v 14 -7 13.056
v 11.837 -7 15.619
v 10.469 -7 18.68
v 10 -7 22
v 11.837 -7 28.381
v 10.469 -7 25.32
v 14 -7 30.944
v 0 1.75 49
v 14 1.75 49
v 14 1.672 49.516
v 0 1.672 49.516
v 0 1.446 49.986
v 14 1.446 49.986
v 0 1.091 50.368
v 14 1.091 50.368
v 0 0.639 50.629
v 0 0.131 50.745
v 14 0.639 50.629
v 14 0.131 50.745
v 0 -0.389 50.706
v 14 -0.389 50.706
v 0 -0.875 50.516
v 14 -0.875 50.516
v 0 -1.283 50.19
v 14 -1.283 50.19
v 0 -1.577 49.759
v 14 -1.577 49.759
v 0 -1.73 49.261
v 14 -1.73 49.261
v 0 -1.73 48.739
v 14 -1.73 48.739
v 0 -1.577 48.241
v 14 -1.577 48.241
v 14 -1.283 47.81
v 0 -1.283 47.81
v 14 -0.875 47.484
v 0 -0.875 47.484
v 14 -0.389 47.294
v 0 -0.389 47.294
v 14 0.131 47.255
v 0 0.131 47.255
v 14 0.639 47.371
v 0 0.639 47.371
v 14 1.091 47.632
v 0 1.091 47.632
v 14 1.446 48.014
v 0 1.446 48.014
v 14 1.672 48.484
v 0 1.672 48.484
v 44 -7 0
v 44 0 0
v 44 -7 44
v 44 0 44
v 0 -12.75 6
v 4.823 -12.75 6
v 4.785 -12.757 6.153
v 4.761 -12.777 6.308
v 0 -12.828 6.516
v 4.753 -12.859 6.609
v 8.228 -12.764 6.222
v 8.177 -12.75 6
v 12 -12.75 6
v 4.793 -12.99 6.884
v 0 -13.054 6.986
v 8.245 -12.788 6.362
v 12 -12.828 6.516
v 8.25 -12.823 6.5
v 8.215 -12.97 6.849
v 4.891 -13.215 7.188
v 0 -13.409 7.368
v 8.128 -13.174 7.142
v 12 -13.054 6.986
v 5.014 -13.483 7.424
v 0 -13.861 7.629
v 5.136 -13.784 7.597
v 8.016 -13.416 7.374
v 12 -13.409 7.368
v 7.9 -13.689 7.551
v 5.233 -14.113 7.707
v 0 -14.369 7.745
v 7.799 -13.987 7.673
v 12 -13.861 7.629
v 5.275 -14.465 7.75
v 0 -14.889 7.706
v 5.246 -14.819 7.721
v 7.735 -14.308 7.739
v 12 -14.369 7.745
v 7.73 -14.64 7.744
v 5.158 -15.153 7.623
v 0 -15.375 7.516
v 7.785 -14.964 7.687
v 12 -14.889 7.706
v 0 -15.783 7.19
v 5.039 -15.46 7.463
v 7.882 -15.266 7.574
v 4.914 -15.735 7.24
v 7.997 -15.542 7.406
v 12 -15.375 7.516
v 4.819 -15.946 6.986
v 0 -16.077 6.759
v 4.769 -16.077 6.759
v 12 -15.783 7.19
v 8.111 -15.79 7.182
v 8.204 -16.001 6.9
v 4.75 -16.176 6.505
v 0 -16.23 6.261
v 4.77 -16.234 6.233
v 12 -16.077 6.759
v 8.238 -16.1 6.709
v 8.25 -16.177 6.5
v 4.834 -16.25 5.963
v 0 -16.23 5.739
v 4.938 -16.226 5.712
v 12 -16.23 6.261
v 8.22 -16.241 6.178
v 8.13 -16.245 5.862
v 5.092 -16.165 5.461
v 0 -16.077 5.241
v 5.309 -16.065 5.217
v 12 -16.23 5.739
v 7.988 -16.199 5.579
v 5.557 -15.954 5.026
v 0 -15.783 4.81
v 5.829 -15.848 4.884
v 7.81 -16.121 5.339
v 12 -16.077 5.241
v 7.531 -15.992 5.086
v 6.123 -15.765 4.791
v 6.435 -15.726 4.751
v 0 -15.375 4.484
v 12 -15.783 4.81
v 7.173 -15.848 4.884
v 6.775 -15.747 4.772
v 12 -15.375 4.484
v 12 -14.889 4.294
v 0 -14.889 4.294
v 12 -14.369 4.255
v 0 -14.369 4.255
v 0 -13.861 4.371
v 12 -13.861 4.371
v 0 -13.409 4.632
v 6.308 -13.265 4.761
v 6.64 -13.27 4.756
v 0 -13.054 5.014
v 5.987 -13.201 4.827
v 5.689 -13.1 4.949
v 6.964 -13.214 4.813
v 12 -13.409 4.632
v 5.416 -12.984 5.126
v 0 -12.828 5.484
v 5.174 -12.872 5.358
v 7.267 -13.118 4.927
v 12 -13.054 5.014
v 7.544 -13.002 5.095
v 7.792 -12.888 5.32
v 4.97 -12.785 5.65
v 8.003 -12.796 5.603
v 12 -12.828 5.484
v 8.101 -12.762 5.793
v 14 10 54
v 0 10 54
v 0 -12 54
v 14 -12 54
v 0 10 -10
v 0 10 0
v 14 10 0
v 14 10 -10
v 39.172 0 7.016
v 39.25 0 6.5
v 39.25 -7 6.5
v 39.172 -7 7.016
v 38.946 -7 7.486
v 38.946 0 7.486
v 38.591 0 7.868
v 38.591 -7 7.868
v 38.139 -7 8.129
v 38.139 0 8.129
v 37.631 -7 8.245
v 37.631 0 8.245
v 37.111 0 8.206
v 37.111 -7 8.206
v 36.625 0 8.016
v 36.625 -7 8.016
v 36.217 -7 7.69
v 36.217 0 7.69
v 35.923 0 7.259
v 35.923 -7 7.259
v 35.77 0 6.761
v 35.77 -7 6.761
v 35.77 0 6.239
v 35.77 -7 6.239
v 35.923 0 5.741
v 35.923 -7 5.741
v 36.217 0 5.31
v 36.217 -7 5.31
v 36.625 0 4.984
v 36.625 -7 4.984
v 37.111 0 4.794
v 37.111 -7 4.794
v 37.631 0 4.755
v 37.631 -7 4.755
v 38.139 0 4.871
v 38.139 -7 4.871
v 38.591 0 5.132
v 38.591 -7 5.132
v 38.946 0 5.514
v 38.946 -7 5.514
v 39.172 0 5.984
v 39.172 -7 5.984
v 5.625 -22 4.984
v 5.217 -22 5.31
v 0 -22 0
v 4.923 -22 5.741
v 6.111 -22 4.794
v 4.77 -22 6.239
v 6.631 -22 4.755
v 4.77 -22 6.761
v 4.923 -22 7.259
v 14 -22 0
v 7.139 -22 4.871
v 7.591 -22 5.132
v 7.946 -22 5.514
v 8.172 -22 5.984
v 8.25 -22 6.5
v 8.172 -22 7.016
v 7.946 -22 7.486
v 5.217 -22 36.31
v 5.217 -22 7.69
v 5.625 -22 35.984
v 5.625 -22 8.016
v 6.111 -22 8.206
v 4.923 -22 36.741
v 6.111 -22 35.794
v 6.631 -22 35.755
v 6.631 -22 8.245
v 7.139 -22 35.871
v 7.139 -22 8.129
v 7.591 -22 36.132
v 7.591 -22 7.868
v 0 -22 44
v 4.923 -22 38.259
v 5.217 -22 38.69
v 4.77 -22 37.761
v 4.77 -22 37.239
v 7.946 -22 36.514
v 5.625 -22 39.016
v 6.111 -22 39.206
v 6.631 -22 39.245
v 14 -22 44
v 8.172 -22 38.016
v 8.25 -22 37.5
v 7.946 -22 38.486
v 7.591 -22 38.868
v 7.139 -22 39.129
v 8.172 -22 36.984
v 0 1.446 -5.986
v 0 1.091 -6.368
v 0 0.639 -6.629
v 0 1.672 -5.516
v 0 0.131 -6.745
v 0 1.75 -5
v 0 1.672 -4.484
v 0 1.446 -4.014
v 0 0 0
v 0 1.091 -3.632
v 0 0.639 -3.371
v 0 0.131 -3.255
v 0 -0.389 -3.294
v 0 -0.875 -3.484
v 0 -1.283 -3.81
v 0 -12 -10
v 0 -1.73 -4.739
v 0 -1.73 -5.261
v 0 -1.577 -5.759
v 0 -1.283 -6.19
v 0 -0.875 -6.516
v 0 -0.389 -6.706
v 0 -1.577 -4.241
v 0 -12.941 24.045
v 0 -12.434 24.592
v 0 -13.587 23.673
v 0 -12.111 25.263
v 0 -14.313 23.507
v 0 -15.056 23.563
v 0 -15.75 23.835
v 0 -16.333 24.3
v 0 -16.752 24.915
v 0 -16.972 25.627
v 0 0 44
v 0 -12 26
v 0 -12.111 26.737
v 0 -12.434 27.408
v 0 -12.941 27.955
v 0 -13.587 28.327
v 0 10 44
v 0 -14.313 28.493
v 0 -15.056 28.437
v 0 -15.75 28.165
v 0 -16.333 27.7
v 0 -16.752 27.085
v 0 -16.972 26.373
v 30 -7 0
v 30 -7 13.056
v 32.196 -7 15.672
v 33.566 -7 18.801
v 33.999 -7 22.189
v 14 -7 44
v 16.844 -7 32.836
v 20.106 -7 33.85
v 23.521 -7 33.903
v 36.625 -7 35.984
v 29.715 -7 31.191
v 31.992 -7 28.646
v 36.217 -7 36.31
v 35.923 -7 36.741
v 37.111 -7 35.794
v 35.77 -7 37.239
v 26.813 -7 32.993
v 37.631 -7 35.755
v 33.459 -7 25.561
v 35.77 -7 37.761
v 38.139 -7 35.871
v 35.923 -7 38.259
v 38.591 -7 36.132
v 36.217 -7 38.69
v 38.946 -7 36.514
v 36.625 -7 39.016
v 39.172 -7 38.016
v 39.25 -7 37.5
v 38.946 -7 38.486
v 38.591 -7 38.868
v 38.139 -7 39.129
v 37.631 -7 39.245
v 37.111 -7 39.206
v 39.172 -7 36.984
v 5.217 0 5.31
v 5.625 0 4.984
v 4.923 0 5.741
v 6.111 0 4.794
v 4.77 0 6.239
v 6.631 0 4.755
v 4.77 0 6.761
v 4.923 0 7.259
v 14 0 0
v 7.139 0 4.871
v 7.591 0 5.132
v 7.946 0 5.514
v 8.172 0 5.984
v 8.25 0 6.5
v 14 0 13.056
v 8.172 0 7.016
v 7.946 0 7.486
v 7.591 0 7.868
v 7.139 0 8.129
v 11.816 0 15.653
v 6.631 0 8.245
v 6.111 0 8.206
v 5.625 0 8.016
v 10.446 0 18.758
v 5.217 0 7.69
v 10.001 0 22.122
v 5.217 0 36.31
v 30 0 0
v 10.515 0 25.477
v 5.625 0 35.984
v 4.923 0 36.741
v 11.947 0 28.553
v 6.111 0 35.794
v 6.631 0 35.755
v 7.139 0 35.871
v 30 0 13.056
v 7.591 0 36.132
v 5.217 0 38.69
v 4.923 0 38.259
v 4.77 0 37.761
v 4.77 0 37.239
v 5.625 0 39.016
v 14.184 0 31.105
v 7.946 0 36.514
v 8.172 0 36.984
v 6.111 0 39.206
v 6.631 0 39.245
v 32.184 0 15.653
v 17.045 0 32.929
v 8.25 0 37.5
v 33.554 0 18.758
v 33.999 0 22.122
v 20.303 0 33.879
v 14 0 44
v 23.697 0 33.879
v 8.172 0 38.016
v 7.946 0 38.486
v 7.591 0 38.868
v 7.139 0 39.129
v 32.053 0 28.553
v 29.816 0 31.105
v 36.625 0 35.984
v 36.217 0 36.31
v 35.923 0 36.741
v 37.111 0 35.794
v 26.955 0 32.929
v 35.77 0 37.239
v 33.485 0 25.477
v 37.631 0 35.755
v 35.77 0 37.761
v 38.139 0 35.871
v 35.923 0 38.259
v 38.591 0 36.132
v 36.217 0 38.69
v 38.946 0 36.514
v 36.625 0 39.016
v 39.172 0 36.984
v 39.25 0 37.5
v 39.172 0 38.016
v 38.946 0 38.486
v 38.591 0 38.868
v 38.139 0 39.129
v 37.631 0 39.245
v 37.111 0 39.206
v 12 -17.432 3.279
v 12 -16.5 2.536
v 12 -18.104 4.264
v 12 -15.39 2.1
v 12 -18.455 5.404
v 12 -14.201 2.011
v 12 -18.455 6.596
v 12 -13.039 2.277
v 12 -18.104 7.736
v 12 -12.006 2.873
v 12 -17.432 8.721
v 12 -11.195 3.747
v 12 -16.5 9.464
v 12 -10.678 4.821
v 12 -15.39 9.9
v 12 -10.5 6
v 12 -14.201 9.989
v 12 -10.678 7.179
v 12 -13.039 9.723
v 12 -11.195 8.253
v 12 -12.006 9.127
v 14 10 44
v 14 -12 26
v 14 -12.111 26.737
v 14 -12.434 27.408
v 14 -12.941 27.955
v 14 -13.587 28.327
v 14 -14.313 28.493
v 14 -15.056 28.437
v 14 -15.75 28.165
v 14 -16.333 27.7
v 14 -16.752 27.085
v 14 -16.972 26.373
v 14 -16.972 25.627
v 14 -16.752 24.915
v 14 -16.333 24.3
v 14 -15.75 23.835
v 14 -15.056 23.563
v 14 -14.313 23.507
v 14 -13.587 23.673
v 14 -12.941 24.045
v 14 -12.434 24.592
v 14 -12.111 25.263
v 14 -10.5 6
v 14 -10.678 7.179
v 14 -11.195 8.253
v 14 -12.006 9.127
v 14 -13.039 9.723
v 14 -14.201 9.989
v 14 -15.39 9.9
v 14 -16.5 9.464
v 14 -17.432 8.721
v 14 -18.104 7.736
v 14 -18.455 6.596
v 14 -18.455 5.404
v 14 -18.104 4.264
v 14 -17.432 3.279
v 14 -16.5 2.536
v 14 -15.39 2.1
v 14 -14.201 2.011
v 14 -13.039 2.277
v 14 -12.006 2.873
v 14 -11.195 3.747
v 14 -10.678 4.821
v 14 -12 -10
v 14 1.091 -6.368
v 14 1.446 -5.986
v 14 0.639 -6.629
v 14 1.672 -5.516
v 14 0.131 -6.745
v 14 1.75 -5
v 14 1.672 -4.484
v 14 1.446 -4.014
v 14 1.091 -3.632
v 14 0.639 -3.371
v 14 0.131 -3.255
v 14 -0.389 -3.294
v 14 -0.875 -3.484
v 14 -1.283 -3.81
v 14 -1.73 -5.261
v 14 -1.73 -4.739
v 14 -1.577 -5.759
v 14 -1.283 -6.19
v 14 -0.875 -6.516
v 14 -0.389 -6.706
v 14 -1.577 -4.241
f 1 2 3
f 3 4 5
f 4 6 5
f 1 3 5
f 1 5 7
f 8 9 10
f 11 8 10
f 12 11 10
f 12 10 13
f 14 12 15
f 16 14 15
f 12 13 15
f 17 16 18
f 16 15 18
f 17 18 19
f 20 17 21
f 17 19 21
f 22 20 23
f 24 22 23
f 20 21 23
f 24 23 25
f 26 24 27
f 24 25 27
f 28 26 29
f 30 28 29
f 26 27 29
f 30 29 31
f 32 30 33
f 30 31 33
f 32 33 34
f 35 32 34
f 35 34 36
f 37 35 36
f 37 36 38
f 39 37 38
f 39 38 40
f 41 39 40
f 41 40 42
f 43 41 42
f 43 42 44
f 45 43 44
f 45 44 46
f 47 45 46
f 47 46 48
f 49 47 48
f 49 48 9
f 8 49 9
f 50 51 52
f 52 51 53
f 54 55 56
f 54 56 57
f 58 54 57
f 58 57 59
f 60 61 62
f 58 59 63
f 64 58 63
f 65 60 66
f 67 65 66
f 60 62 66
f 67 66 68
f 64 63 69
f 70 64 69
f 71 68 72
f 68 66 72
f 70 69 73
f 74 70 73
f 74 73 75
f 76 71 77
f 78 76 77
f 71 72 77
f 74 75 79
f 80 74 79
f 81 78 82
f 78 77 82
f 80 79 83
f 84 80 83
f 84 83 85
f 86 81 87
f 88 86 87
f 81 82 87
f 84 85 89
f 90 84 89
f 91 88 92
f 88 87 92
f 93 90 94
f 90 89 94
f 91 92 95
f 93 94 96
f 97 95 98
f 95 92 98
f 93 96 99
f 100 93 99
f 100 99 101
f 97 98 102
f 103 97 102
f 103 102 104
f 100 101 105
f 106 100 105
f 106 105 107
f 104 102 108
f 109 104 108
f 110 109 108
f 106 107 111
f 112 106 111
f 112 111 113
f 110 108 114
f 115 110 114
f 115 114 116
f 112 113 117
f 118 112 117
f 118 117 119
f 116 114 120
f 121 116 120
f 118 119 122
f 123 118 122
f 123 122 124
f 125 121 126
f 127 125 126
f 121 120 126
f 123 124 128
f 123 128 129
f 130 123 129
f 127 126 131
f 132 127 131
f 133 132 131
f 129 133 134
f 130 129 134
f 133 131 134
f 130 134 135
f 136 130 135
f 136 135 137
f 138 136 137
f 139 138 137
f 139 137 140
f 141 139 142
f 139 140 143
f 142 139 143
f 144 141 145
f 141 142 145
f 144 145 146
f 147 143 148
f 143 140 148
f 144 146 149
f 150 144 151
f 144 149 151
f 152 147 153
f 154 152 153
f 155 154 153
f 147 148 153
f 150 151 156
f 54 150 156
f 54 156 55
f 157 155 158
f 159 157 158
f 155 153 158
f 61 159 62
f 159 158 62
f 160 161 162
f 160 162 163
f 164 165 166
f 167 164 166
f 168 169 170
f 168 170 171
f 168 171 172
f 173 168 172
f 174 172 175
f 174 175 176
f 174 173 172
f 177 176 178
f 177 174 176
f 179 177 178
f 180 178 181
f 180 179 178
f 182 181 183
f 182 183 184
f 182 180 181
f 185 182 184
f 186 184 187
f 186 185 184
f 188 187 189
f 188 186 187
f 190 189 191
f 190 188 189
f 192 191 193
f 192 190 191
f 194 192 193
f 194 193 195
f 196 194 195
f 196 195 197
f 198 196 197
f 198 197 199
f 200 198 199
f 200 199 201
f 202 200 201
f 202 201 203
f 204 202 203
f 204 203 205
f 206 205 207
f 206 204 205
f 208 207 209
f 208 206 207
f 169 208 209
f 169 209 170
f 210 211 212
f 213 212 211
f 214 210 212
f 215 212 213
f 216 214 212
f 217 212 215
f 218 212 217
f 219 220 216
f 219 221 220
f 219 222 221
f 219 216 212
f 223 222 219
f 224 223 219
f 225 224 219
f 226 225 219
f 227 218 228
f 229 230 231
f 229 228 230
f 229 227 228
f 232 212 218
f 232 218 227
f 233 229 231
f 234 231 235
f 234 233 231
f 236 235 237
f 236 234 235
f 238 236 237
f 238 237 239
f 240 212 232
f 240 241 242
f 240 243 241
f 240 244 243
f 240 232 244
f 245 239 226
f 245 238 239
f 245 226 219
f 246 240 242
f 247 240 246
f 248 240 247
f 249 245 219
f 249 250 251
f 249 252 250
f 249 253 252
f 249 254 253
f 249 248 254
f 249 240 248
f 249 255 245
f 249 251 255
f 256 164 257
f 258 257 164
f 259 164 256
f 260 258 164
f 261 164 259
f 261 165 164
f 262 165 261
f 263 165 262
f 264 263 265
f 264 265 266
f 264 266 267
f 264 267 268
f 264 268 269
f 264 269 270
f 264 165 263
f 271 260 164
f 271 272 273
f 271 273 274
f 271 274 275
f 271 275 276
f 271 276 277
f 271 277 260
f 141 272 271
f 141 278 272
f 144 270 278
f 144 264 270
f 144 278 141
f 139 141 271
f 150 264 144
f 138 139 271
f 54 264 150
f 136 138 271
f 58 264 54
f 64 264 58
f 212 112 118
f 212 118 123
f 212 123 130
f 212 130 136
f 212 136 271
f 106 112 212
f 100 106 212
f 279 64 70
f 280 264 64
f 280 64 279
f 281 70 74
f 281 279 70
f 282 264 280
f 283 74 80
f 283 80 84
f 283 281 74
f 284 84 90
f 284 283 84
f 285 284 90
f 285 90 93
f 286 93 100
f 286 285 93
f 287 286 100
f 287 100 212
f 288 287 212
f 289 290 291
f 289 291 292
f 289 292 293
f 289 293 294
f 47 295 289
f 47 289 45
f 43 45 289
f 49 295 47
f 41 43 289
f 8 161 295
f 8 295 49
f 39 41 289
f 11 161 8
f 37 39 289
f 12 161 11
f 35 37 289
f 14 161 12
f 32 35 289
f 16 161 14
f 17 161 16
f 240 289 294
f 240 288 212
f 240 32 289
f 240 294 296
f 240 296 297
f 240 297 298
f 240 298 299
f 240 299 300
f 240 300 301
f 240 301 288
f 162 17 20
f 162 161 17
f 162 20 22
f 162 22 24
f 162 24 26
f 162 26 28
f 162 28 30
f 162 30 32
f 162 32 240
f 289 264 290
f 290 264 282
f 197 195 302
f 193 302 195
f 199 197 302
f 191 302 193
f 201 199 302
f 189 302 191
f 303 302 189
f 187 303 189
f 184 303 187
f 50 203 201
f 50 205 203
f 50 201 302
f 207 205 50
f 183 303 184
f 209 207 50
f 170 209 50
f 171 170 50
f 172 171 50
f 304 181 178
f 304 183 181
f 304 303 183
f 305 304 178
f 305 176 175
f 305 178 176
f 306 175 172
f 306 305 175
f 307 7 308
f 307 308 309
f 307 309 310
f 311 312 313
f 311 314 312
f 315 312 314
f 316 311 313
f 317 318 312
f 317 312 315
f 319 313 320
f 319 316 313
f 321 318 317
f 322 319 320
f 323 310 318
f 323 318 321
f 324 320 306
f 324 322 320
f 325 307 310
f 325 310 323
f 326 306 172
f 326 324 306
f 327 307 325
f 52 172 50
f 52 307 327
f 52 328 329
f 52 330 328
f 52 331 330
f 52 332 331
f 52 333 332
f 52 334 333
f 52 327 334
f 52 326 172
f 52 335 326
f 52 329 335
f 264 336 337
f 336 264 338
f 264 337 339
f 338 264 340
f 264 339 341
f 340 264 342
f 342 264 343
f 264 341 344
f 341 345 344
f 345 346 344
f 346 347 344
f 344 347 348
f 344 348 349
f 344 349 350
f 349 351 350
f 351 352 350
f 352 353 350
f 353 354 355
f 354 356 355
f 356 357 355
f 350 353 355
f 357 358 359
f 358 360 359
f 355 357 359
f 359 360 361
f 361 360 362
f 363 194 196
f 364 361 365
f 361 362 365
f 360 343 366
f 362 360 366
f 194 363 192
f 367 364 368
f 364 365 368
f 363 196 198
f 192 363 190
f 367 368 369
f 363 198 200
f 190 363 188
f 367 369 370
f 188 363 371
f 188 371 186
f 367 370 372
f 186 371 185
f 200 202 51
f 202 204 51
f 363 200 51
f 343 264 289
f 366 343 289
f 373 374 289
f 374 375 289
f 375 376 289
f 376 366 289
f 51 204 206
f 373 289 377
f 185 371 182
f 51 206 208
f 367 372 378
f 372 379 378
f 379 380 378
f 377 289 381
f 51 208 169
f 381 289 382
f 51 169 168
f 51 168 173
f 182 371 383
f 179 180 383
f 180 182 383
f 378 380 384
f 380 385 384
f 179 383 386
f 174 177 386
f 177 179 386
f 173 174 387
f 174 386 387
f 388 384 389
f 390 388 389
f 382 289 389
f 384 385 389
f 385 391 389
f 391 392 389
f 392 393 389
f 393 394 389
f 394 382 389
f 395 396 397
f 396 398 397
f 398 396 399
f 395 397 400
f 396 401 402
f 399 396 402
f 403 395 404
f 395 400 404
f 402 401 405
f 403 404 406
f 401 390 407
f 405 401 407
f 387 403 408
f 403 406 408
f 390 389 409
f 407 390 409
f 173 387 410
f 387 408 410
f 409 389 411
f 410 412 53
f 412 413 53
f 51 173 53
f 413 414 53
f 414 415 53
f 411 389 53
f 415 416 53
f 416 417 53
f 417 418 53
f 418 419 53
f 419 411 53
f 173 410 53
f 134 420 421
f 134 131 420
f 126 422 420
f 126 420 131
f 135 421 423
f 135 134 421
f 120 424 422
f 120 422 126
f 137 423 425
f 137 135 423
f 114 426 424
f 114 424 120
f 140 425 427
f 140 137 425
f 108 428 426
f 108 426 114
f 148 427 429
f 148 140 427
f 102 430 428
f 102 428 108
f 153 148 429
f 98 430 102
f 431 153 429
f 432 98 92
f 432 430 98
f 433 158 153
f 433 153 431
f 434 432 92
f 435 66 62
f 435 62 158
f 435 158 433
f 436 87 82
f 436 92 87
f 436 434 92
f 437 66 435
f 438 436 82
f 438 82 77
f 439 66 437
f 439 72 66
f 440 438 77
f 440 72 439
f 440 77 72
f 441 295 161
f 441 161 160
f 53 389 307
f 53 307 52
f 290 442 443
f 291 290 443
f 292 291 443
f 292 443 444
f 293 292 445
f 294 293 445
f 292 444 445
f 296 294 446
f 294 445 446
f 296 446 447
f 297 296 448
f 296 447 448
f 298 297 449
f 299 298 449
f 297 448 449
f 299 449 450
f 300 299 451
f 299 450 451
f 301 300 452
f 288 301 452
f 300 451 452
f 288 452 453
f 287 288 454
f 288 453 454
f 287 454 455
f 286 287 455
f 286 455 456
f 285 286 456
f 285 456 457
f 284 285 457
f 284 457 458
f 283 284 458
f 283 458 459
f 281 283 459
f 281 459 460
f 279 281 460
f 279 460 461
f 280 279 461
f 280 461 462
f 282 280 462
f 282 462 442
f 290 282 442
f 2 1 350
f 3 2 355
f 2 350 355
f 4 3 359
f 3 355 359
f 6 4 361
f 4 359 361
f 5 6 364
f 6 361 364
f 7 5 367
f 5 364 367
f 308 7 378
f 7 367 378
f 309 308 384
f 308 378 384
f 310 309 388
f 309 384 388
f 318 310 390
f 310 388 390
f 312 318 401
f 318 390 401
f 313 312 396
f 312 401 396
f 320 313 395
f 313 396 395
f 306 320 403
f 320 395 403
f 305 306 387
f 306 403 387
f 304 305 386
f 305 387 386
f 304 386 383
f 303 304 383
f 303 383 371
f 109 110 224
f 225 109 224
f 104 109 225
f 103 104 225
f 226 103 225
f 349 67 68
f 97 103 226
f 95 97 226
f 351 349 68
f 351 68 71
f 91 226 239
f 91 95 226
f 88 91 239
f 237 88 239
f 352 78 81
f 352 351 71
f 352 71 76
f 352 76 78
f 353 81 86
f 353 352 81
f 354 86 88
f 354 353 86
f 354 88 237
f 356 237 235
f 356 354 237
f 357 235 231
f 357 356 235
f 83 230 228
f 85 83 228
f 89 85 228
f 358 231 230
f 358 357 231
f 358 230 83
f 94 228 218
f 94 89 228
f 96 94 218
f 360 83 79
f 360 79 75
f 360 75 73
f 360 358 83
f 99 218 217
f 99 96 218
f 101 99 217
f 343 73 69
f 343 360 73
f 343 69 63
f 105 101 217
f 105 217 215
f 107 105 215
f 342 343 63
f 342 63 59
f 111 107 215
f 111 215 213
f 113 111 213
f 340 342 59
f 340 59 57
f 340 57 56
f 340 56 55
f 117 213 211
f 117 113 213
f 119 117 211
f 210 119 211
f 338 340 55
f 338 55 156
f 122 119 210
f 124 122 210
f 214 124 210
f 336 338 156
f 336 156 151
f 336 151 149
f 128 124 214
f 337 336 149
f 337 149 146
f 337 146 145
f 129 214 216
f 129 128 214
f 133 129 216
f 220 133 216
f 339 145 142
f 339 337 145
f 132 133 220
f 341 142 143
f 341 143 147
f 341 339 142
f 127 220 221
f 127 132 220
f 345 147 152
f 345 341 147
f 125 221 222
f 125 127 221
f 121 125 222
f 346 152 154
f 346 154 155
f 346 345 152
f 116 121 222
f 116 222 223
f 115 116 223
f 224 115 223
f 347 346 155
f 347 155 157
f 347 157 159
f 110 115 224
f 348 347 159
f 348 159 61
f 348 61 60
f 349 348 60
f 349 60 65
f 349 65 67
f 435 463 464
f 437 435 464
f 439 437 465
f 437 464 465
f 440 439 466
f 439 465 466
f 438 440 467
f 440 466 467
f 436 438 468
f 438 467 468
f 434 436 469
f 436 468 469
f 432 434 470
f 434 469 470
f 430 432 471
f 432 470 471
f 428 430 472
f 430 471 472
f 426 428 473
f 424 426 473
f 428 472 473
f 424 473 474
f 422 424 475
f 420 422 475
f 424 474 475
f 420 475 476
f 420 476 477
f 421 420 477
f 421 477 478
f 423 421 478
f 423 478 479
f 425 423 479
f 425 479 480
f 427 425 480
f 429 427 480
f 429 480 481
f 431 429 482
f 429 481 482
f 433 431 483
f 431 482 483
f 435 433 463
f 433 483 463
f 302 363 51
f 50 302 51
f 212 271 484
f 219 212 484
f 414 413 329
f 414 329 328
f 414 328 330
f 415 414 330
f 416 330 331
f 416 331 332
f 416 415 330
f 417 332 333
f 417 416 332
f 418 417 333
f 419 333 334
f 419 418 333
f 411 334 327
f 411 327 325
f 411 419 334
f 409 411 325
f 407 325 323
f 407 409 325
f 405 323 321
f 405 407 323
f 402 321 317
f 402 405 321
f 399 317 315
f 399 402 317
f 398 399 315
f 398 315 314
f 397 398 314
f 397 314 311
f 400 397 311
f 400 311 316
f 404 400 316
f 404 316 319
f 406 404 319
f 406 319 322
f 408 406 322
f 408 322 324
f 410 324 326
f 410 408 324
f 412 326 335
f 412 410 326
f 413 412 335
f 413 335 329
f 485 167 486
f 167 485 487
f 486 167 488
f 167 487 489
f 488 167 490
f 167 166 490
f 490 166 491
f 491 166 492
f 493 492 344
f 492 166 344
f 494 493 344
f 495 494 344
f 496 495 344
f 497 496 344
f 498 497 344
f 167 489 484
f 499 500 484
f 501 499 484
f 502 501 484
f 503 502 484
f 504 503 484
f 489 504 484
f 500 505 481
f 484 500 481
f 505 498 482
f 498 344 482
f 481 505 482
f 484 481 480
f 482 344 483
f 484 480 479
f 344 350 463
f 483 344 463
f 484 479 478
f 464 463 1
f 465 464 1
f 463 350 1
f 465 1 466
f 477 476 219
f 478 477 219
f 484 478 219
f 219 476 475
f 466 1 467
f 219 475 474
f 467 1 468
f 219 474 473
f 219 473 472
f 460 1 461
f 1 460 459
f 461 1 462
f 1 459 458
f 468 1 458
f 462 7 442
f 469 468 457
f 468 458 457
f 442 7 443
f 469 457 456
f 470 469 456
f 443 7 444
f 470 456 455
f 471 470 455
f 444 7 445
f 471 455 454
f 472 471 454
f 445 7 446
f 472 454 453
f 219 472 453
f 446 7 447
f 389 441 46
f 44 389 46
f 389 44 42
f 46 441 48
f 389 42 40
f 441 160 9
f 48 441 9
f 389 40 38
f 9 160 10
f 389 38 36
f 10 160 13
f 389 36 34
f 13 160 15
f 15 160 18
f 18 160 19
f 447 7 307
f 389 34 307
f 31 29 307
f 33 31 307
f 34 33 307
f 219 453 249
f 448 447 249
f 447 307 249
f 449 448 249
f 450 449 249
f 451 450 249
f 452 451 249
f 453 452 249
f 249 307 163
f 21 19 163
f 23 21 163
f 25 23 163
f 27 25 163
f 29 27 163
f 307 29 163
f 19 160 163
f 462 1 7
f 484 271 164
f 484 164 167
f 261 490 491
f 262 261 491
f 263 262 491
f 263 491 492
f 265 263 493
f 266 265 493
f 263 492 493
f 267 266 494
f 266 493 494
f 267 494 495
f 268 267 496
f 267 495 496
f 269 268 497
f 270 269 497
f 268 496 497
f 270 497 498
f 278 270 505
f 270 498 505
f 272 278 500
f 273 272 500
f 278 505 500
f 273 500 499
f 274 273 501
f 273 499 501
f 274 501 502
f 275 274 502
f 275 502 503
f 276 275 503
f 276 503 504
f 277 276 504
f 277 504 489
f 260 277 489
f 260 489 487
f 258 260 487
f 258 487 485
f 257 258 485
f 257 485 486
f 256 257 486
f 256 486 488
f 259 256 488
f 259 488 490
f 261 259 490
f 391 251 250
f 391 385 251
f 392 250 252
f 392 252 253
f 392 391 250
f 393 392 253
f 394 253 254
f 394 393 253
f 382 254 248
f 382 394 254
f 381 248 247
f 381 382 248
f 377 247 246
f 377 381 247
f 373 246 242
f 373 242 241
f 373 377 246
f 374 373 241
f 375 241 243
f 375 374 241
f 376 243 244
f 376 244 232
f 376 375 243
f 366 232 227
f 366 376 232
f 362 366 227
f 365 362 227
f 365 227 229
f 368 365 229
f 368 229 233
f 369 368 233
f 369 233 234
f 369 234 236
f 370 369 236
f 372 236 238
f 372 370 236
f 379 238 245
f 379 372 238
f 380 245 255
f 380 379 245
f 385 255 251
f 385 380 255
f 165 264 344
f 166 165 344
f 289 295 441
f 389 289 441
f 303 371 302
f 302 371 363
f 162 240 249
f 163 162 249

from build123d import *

# Parameters (mm, degrees)
F0_R      = 1.75
F1_DEPTH  = 7
F2_W      = 14
F2_H      = 44
F2_R      = 1.75
F3_DEPTH  = 15
F4_R      = 2.5
F4_R_2    = 1.75
F5_DEPTH  = 25
F6_R      = 4
F7_DEPTH  = 2
F8_W      = 14
F8_H      = 32
F9_DEPTH  = 10
F10_W     = 14
F10_H     = 32
F11_DEPTH = 10
F12_R     = 1.75
F13_DEPTH = 25
F14_SIZE  = 10


with BuildPart() as f1:
    # F0 (on Front) → F1 (new body)
    with BuildSketch(Plane.XZ):
        with BuildLine():
            Line((0, 44), (0, 0))
            Line((0, 0), (14, 0))
            Line((14, 0), (14, 13.055728))
            ThreePointArc((14, 13.055728), (22, 34), (30, 13.055728))
            Line((30, 13.055728), (30, 0))
            Line((30, 0), (44, 0))
            Line((44, 0), (44, 44))
            Line((44, 44), (0, 44))
        make_face()
        with Locations((6.5, 6.5)):
            Circle(F0_R, mode=Mode.SUBTRACT)
        with Locations((37.5, 6.5)):
            Circle(F0_R, mode=Mode.SUBTRACT)
        with Locations((6.5, 37.5)):
            Circle(F0_R, mode=Mode.SUBTRACT)
        with Locations((37.5, 37.5)):
            Circle(F0_R, mode=Mode.SUBTRACT)
    extrude(amount=F1_DEPTH)

    # F2 (on face) → F3 (join)
    with BuildSketch(Plane.XZ.offset(7)):
        with Locations((7, 22)):
            Rectangle(F2_W, F2_H)
        with Locations((6.5, 6.5)):
            Circle(F2_R, mode=Mode.SUBTRACT)
        with Locations((6.5, 37.5)):
            Circle(F2_R, mode=Mode.SUBTRACT)
    extrude(amount=F3_DEPTH)

    # F4 (on face) → F5 (cut)
    with BuildSketch(Plane.YZ.offset(14)):
        with Locations((-14.5, 26)):
            Circle(F4_R)
        with Locations((-14.5, 6)):
            Circle(F4_R_2)
    extrude(amount=-F5_DEPTH, mode=Mode.SUBTRACT)

    # F6 (on face) → F7 (cut)
    with BuildSketch(Plane.YZ.offset(14)):
        with Locations((-14.5, 6)):
            Circle(F6_R)
    extrude(amount=-F7_DEPTH, mode=Mode.SUBTRACT)

    # F8 (on face) → F9 (join)
    with BuildSketch(Plane.XY.offset(44)):
        with Locations((7, -6)):
            Rectangle(F8_W, F8_H)
    extrude(amount=F9_DEPTH)

    # F10 (on face) → F11 (join)
    with BuildSketch(Plane(origin=(0, 0, 0), x_dir=(1, 0, 0), z_dir=(0, 0, -1))):
        with Locations((7, 6)):
            Rectangle(F10_W, F10_H)
    extrude(amount=F11_DEPTH)

    # F12 (on face) → F13 (cut)
    with BuildSketch(Plane.YZ.offset(14)):
        with Locations((0, 49)):
            Circle(F12_R)
        with Locations((0, -5)):
            Circle(F12_R)
    extrude(amount=-F13_DEPTH, mode=Mode.SUBTRACT)

    # F14
    f14_edges = [f1.edges().sort_by_distance(p)[0] for p in [
        (7, -22, 54),
        (7, -22, -10),
    ]]
    chamfer(f14_edges, length=F14_SIZE)


solid = f1.part
